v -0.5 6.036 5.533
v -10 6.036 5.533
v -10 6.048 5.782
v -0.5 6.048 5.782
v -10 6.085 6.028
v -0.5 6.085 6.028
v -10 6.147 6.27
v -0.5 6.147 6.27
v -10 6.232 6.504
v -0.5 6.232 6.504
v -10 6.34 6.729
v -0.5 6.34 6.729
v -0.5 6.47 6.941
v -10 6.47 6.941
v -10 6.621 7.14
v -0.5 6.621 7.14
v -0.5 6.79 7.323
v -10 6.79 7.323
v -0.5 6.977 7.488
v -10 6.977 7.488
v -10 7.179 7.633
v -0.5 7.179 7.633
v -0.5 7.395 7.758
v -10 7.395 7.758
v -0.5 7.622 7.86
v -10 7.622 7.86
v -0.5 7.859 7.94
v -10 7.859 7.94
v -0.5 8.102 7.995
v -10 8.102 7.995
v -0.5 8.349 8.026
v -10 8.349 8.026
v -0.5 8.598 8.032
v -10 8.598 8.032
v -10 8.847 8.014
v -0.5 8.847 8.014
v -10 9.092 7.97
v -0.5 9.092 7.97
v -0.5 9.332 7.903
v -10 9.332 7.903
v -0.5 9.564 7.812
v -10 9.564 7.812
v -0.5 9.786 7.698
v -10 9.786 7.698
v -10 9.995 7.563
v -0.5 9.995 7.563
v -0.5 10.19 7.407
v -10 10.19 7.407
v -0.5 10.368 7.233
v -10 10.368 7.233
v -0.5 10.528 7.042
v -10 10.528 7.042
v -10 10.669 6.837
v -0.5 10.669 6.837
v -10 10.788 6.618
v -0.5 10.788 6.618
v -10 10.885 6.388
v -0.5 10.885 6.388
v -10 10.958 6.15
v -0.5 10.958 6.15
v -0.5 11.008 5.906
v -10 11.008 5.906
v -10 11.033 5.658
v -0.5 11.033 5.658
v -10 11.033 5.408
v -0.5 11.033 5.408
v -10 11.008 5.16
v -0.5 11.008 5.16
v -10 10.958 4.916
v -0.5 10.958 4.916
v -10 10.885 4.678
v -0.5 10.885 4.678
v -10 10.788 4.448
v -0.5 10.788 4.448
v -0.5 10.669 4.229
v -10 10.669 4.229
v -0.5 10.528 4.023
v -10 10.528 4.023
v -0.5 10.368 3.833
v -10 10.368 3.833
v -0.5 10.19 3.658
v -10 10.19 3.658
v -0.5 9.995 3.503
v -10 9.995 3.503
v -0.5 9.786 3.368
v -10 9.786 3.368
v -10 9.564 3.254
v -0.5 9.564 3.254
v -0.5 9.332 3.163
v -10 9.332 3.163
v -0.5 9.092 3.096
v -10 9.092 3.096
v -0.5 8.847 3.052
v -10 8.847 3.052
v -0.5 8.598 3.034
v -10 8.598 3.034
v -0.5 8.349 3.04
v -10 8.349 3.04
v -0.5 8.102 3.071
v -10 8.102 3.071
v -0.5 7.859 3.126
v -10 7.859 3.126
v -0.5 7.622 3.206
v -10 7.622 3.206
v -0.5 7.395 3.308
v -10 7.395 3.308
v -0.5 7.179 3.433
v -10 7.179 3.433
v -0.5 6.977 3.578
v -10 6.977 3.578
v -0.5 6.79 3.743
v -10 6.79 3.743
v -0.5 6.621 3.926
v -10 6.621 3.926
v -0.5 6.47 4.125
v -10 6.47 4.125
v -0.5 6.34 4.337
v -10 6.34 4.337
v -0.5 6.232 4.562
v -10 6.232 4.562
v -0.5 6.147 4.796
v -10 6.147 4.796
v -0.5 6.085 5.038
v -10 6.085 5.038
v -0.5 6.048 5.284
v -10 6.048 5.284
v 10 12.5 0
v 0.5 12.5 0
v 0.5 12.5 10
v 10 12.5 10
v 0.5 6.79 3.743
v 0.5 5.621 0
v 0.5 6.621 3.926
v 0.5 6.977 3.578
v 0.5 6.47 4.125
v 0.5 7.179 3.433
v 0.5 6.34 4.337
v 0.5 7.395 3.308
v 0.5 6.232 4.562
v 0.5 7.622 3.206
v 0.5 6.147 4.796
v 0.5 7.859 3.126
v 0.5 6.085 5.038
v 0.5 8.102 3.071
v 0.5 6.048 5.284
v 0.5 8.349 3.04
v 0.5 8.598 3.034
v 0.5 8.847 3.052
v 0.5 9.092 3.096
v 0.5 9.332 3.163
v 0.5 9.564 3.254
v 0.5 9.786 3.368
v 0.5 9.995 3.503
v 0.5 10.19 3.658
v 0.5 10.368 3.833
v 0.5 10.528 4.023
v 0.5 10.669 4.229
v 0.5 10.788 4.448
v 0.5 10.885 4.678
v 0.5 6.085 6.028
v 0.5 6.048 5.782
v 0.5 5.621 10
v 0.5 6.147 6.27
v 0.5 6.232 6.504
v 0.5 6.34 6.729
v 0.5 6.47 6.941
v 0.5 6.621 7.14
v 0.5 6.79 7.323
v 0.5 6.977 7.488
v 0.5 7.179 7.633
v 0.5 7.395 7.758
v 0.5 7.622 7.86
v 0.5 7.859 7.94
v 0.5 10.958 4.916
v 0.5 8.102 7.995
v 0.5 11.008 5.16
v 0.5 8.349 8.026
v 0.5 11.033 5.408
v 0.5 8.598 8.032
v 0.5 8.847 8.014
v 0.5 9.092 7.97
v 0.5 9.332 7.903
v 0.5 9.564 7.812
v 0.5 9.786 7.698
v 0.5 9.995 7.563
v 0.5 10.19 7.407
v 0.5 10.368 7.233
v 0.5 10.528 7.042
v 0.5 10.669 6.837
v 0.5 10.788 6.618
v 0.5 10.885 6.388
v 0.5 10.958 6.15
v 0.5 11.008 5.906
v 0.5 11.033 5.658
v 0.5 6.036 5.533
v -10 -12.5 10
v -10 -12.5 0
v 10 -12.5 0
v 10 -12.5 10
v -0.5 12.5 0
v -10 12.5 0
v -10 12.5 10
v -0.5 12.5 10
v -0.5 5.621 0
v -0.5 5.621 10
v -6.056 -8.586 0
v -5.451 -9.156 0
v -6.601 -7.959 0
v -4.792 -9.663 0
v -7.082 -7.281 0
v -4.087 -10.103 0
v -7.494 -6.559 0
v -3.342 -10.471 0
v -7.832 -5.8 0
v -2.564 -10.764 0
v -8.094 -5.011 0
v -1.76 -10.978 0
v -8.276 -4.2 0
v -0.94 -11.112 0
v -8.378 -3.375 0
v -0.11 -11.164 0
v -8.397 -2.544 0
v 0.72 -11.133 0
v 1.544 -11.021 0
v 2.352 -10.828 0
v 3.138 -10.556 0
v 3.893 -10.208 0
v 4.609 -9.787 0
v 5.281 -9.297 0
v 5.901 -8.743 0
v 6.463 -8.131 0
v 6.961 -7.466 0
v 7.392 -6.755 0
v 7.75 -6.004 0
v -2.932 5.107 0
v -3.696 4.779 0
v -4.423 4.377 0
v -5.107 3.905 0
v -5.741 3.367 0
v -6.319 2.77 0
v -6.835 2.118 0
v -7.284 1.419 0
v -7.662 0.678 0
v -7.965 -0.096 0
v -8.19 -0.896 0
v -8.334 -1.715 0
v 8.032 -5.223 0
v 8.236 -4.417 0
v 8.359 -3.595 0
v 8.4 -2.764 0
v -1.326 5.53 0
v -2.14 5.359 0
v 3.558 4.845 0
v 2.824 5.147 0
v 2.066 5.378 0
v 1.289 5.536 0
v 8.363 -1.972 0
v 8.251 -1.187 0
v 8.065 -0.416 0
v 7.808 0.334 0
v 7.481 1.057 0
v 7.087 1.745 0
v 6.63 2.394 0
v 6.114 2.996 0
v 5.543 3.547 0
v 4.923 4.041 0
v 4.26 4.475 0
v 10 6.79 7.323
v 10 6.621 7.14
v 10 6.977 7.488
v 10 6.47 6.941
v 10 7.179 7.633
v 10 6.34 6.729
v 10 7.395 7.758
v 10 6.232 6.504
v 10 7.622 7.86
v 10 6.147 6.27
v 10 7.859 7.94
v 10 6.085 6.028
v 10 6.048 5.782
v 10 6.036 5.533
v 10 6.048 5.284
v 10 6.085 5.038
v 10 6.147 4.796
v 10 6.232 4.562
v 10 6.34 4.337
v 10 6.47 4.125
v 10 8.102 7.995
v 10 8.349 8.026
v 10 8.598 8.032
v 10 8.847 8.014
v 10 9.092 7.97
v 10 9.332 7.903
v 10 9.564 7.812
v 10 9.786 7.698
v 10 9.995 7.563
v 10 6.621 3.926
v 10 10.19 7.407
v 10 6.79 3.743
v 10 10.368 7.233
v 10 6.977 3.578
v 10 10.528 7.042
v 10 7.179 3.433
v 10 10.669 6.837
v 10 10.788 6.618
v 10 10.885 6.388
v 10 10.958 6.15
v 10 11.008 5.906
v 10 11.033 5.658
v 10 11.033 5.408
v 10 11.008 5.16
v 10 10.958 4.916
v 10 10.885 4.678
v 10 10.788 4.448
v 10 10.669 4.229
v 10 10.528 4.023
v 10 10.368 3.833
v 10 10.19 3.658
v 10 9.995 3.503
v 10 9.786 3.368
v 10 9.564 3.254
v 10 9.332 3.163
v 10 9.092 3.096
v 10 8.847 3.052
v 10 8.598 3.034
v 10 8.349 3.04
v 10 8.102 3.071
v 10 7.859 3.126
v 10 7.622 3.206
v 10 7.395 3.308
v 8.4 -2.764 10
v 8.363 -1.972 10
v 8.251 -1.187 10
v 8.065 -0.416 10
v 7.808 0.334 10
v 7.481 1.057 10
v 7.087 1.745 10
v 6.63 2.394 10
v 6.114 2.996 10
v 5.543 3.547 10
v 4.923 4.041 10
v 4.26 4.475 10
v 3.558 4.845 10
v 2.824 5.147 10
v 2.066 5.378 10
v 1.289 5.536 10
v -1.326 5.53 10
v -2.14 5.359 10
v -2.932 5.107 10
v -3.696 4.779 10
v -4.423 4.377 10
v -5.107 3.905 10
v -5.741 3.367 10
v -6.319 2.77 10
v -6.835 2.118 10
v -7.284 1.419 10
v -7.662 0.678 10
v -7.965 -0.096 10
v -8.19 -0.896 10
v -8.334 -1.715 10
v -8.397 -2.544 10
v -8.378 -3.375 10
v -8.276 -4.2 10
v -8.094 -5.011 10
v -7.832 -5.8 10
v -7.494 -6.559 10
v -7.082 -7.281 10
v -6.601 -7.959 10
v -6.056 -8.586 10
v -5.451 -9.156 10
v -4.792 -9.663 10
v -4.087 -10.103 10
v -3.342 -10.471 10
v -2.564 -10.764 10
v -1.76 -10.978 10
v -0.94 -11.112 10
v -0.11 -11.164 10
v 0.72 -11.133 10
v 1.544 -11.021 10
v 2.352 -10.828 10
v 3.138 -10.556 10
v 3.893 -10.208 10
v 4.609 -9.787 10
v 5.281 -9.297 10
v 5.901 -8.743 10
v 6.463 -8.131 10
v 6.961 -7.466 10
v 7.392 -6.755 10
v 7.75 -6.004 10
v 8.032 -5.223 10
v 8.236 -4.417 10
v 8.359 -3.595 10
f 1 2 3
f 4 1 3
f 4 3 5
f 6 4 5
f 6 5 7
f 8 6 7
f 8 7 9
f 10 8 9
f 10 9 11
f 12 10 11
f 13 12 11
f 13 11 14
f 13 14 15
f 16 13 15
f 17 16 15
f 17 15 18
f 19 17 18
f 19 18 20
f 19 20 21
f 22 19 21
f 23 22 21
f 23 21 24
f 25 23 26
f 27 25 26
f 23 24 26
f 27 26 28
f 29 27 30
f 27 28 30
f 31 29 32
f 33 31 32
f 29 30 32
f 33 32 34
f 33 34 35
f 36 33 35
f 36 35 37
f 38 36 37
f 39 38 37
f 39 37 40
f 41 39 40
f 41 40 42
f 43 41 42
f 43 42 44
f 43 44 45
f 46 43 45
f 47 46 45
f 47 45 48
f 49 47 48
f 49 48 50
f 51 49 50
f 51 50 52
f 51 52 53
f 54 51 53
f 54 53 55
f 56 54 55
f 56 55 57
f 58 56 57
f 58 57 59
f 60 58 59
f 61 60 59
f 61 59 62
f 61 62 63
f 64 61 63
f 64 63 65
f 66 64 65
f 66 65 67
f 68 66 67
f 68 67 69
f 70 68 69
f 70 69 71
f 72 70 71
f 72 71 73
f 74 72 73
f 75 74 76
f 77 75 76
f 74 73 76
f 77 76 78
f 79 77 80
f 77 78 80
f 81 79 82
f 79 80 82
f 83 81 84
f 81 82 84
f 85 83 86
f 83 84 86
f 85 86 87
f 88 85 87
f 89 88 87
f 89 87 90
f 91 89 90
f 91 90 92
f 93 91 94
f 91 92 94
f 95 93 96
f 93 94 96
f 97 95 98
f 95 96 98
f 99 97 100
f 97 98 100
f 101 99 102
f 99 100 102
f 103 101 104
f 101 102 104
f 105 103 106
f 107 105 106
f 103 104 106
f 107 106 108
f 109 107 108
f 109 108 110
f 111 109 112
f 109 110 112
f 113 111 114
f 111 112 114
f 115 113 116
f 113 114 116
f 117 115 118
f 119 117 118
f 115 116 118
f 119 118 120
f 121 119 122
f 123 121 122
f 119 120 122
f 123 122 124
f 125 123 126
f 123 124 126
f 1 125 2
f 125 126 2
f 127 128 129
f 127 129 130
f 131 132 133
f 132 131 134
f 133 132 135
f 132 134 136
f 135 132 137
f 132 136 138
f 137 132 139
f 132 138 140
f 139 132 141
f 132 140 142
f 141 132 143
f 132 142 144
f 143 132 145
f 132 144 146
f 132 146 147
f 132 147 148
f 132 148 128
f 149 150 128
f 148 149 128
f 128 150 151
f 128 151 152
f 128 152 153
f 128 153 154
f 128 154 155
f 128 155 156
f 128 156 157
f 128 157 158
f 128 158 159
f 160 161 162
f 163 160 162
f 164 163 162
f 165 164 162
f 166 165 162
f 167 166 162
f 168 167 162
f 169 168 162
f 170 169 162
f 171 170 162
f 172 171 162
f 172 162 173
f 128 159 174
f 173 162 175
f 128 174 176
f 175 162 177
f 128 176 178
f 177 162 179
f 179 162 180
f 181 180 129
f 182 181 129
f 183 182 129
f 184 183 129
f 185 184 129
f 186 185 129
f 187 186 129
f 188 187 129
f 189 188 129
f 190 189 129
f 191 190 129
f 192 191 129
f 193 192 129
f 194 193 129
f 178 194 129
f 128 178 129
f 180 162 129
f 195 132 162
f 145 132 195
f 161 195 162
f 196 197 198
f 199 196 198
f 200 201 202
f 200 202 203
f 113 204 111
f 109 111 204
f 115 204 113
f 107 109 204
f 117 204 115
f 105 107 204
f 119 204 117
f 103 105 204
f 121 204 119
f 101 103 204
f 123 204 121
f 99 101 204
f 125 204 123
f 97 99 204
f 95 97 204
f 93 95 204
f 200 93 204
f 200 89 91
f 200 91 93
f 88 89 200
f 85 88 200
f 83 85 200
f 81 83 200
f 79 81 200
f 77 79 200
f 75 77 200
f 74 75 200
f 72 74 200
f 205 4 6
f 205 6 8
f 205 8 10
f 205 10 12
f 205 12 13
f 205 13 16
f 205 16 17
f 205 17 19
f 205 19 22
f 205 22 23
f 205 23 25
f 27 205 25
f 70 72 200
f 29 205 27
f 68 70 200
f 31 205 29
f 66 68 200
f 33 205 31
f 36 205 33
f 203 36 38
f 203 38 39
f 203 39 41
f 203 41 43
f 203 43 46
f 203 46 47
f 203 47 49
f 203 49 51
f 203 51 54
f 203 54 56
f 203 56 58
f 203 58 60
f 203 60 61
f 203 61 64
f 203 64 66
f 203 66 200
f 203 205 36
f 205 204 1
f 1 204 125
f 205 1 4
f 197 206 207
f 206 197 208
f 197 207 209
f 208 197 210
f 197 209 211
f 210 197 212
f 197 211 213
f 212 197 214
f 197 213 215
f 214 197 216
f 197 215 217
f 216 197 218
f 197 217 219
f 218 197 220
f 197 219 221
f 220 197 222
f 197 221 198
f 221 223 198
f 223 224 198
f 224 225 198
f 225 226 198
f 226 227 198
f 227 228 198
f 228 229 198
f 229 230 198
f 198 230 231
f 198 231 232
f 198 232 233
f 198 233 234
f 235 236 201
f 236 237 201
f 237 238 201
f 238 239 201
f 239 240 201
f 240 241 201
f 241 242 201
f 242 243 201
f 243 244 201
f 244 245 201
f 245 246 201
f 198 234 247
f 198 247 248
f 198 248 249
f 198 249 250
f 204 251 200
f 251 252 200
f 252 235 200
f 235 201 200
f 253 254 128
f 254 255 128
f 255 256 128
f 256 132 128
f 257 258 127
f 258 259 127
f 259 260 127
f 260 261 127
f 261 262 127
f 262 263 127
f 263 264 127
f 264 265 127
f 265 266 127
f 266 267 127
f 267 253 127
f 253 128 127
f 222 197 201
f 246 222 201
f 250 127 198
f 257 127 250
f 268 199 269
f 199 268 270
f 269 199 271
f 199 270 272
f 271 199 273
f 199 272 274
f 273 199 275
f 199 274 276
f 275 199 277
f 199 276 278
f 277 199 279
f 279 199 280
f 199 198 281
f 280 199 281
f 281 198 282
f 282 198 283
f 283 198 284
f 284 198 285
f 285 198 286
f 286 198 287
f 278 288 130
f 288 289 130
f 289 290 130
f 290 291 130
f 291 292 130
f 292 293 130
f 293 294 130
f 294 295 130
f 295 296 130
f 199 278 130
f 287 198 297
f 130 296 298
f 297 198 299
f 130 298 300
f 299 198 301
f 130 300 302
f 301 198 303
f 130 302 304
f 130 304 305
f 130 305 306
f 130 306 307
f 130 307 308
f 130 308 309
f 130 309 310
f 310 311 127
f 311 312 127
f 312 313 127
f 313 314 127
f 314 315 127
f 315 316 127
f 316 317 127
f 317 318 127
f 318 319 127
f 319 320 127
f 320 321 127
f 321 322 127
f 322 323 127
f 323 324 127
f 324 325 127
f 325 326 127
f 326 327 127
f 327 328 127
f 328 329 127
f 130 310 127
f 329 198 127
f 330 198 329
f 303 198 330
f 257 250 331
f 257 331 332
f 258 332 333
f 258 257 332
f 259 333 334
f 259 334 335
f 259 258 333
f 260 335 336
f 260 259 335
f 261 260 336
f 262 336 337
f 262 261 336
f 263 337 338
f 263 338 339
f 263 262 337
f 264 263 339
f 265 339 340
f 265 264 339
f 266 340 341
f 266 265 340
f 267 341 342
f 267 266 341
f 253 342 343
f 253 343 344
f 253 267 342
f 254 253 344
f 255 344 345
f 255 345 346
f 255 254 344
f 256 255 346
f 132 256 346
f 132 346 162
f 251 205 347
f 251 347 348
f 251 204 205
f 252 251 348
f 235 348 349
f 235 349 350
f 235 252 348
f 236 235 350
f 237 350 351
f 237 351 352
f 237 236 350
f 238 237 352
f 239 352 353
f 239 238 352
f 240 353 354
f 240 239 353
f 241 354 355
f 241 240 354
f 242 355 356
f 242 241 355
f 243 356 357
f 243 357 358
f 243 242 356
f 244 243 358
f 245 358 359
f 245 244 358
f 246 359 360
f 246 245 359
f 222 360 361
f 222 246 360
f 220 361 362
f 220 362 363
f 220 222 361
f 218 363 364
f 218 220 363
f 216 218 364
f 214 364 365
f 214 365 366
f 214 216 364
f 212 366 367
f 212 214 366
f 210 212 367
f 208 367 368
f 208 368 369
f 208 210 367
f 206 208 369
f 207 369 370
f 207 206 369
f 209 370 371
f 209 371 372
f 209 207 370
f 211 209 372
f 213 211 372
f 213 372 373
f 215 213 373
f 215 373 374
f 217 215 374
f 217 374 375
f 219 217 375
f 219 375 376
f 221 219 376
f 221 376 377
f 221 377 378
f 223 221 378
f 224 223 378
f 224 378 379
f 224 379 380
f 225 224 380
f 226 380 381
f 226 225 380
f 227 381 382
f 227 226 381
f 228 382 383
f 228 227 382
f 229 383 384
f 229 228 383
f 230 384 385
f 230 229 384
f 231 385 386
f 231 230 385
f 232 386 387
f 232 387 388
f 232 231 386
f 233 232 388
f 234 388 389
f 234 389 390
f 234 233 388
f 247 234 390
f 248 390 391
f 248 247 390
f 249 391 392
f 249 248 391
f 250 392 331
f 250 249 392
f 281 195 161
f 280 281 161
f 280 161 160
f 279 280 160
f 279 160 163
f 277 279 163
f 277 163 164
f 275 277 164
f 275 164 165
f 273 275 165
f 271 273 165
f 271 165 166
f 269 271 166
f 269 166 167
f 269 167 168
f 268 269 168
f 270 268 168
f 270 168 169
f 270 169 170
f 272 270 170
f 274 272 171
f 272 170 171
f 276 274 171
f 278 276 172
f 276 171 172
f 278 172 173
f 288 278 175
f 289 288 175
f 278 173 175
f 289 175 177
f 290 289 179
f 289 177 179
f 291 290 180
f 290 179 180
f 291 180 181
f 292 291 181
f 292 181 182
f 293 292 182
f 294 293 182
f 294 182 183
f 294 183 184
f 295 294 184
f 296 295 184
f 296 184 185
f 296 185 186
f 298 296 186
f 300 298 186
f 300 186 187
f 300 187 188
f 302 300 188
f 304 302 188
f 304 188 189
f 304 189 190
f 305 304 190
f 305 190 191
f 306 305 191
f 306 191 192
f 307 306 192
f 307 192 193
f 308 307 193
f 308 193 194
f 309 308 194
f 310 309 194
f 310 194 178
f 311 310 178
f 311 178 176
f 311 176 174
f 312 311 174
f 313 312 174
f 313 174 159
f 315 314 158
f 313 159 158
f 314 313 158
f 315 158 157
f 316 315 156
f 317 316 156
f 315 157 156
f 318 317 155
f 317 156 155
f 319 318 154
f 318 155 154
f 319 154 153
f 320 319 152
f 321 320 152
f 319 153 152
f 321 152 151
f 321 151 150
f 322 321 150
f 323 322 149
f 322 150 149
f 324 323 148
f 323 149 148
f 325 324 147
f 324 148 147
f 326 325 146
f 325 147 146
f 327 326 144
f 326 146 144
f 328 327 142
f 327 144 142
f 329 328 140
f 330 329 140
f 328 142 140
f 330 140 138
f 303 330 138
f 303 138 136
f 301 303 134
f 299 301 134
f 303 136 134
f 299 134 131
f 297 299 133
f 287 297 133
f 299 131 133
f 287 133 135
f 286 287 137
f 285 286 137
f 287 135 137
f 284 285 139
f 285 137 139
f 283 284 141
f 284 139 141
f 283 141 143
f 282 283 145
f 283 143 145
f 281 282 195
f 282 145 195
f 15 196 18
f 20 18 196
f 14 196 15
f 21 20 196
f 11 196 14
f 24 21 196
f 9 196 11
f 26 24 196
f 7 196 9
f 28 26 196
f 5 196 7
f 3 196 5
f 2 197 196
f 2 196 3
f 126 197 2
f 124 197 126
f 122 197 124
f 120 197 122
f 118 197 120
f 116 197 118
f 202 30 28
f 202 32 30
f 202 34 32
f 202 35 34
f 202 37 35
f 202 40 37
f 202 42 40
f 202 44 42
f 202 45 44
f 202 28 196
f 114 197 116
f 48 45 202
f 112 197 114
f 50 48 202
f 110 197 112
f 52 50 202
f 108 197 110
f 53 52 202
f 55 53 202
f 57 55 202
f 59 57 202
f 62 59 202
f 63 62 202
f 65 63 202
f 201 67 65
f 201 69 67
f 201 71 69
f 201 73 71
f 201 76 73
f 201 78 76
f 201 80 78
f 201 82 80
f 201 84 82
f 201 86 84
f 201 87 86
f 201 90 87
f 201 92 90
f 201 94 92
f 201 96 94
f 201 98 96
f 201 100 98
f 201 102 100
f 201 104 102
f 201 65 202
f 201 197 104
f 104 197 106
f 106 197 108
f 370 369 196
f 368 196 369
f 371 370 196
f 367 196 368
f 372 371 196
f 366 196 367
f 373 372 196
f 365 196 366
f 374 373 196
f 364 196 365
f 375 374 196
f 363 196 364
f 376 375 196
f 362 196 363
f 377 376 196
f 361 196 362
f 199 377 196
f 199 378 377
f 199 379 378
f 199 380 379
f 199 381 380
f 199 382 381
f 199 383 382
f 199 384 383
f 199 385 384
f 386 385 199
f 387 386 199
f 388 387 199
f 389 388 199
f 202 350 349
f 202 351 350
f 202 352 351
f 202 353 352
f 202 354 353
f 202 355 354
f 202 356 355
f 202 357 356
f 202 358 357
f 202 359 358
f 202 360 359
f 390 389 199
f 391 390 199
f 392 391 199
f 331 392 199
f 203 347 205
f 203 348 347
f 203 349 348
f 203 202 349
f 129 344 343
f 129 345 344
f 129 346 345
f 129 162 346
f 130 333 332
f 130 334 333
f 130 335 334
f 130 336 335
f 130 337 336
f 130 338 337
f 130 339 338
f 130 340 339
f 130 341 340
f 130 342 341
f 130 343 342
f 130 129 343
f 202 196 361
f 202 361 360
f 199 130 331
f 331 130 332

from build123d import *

# Parameters (mm, degrees)
F0_W     = 20
F0_H     = 25
F0_R     = 8.4
F1_DEPTH = 10
F2_W     = 1
F2_H     = 6.8792646822
F3_DEPTH = 10
F4_R     = 2.5
F5_DEPTH = 20


with BuildPart() as f1:
    # F0 (on Top) → F1 (new body)
    with BuildSketch(Plane.XY):
        Rectangle(F0_W, F0_H)
        with Locations((0, -2.7643705253)):
            Circle(F0_R, mode=Mode.SUBTRACT)
    extrude(amount=F1_DEPTH)

    # F2 (on face) → F3 (cut)
    with BuildSketch(Plane.XY.offset(10)):
        with Locations((0, 9.0603676589)):
            Rectangle(F2_W, F2_H)
    extrude(amount=-F3_DEPTH, mode=Mode.SUBTRACT)

    # F4 (on face) → F5 (cut)
    with BuildSketch(Plane(origin=(-10, 0, 0), x_dir=(0, -1, 0), z_dir=(-1, 0, 0))):
        with Locations((-8.5356631532, 5.5329478068)):
            Circle(F4_R)
    extrude(amount=-F5_DEPTH, mode=Mode.SUBTRACT)


solid = f1.part
